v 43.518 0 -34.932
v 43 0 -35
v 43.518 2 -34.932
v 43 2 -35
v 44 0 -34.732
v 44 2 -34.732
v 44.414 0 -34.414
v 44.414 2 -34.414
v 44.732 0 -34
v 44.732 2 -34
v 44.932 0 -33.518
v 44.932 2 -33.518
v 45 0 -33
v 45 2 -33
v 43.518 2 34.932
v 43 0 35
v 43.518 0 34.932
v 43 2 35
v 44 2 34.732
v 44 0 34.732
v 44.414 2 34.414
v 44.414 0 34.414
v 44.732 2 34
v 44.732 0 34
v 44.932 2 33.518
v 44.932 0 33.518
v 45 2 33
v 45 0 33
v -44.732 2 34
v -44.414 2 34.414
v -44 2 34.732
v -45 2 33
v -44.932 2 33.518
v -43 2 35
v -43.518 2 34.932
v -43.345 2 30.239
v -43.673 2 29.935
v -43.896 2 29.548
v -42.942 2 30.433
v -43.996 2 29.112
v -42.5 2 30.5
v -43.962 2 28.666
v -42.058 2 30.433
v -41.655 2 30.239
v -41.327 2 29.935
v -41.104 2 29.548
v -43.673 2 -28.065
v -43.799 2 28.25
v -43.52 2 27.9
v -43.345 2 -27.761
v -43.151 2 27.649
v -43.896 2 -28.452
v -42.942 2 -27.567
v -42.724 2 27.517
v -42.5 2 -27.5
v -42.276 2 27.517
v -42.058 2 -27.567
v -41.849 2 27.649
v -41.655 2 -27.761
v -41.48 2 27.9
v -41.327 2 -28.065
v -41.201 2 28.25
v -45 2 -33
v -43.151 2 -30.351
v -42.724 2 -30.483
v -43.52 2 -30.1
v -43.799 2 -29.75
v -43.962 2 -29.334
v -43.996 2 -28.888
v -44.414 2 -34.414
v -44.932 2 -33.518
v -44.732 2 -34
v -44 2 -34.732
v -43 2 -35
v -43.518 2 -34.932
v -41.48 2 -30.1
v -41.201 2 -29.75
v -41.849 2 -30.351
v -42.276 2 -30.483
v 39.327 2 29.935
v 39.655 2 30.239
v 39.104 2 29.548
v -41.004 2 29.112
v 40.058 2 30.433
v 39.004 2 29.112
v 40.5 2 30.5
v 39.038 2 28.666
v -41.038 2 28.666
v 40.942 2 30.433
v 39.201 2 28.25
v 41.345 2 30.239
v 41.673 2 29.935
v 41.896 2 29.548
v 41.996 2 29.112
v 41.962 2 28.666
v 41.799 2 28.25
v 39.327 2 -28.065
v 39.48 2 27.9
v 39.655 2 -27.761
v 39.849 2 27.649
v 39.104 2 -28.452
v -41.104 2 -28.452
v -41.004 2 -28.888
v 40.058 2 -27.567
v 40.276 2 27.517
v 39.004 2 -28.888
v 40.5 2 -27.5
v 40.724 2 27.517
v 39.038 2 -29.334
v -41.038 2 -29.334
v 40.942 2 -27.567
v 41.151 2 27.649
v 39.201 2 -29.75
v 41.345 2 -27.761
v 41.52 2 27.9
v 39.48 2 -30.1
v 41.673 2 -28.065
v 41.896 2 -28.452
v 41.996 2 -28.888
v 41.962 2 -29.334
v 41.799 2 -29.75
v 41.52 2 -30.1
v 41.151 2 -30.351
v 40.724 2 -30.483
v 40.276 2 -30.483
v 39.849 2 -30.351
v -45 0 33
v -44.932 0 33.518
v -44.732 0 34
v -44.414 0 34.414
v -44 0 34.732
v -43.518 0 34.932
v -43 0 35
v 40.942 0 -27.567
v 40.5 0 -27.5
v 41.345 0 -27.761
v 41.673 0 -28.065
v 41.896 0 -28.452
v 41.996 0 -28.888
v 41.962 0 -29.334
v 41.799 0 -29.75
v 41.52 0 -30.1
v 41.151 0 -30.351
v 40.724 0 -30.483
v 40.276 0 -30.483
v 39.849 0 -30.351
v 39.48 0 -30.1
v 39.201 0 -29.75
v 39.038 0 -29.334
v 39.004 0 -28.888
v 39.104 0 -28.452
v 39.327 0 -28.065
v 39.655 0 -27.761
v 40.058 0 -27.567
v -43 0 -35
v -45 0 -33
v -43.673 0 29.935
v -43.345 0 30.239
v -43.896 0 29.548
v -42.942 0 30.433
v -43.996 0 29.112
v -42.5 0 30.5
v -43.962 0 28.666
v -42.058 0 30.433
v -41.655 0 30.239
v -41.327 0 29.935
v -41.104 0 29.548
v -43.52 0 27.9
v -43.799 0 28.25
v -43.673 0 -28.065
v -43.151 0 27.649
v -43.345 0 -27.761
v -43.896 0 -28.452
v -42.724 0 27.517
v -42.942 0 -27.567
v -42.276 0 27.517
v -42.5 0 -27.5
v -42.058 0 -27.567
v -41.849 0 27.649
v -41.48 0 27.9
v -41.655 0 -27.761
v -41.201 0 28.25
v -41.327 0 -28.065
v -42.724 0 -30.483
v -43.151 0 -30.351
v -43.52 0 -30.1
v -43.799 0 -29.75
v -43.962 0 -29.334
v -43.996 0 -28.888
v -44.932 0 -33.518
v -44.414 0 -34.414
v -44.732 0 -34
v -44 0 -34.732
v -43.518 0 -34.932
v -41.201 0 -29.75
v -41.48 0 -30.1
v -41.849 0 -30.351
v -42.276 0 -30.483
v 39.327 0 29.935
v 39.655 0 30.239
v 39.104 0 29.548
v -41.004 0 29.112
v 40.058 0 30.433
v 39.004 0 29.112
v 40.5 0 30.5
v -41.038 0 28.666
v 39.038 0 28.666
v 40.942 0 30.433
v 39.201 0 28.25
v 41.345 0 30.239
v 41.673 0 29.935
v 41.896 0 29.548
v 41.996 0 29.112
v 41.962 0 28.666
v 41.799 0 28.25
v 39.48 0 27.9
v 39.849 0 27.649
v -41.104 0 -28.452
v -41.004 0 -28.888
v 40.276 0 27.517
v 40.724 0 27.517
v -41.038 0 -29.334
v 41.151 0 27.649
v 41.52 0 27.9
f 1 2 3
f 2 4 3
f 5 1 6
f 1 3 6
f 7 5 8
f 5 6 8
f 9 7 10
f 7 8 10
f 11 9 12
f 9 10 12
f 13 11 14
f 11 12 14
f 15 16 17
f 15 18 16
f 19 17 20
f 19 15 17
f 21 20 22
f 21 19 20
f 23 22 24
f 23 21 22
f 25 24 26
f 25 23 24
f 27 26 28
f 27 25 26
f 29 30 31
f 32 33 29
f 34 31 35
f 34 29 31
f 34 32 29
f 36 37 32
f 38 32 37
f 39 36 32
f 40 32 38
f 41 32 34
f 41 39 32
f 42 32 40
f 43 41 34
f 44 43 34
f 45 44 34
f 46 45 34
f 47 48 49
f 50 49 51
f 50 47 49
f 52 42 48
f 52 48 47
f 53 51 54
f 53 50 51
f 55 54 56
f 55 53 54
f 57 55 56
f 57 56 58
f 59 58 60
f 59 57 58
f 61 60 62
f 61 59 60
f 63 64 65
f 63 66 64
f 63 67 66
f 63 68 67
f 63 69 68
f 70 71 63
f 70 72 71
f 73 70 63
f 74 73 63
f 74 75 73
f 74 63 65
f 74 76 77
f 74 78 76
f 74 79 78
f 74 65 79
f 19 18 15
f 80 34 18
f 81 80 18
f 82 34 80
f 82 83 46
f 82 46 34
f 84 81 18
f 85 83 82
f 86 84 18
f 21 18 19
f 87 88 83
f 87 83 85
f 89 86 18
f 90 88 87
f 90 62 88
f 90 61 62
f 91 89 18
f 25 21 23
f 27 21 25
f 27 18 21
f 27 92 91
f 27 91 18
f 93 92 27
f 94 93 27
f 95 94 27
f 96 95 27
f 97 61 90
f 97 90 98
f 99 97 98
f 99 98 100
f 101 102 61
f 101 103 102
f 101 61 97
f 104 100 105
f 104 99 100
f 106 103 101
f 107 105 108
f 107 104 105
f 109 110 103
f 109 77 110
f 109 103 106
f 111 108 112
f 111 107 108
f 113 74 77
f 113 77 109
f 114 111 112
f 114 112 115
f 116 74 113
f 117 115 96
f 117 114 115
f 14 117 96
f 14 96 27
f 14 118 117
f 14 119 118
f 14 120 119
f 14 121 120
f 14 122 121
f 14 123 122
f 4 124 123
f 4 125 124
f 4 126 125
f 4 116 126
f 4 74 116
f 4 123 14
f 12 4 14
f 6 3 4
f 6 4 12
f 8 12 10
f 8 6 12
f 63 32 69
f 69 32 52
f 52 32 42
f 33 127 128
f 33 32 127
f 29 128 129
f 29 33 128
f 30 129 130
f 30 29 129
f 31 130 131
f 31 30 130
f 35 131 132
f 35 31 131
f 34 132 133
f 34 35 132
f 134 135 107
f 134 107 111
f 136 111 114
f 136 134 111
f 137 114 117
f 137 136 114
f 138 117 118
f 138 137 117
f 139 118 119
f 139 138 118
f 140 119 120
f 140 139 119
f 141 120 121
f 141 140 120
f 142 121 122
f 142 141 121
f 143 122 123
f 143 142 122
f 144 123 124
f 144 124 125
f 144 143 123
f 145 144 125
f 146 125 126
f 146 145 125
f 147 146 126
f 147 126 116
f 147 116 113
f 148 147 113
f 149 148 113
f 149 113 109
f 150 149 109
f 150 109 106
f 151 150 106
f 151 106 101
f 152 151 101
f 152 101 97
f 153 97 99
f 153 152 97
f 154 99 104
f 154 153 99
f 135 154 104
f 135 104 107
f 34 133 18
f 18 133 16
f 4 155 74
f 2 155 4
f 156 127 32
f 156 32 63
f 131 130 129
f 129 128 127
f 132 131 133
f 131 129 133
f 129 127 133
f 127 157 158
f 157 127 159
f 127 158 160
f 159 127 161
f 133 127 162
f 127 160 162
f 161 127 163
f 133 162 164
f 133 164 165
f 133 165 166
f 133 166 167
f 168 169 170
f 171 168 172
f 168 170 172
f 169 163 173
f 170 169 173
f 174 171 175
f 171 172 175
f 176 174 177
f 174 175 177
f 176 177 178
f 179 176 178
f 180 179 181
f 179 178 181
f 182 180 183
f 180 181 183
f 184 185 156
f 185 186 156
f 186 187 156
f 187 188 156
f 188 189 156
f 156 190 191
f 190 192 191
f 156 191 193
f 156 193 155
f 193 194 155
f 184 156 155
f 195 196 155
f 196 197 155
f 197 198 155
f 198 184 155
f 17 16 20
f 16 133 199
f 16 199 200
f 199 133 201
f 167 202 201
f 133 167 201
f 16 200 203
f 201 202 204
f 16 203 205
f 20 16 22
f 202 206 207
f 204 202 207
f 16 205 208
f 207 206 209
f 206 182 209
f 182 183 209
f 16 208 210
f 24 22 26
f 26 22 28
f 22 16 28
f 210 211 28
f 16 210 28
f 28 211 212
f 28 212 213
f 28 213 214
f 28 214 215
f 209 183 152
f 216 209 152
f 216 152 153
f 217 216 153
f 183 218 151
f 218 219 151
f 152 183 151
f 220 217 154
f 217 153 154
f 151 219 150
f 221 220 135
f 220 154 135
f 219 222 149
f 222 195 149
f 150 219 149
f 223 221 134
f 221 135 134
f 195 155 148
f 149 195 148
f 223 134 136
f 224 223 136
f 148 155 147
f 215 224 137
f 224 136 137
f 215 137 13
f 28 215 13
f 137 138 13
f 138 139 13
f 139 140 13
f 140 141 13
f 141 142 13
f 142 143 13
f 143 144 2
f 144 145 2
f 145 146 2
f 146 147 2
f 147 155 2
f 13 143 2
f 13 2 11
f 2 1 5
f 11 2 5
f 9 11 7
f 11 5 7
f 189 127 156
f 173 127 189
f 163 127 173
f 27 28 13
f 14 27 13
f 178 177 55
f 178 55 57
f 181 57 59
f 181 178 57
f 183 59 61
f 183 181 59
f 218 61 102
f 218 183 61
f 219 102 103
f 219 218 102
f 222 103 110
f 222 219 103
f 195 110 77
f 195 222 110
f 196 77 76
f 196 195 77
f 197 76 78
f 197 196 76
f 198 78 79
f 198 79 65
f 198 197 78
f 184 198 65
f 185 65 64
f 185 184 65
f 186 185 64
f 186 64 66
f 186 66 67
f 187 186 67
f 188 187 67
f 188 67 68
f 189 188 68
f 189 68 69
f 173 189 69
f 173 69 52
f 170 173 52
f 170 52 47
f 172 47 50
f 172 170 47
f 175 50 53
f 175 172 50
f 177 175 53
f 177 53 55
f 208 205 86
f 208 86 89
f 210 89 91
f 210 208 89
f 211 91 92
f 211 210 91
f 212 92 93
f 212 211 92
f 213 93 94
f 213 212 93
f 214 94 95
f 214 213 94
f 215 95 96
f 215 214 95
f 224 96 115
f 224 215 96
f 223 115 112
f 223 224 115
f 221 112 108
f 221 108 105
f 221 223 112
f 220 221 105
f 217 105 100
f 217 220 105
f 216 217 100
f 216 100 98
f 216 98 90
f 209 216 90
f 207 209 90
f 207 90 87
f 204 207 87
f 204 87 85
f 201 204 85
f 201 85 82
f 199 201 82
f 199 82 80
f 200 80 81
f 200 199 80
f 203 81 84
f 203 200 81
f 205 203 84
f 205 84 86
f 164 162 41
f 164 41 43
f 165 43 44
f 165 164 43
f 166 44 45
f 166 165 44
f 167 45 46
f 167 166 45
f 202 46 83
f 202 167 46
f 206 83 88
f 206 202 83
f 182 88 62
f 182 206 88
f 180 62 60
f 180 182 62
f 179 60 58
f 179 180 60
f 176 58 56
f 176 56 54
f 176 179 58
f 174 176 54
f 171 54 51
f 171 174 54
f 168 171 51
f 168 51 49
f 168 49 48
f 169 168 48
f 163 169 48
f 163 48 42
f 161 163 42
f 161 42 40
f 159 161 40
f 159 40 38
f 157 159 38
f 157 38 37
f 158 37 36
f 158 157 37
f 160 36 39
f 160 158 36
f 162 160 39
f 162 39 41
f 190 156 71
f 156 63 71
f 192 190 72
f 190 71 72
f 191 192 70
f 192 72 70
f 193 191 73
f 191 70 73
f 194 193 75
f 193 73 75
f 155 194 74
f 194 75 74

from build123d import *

# Parameters (mm, degrees)
CROQUIS1_W              = 90
CROQUIS1_H              = 70
CROQUIS1_R              = 1.5
SALIENTE_EXTRUIR1_DEPTH = 2
REDONDEO1_R             = 2


with BuildPart() as part:
    # Croquis1 → Saliente-Extruir1 (new body)
    with BuildSketch(Plane(origin=(0, 0, 0), x_dir=(1, 0, 0), z_dir=(0, 1, 0))):
        Rectangle(CROQUIS1_W, CROQUIS1_H)
        with Locations(Location((-42.5, -29, 0), (0, 0, 270))):
            Circle(CROQUIS1_R, mode=Mode.SUBTRACT)
        with Locations(Location((-42.5, 29, 0), (0, 0, 270))):
            Circle(CROQUIS1_R, mode=Mode.SUBTRACT)
        with Locations(Location((40.5, -29, 0), (0, 0, 270))):
            Circle(CROQUIS1_R, mode=Mode.SUBTRACT)
        with Locations(Location((40.5, 29, 0), (0, 0, 270))):
            Circle(CROQUIS1_R, mode=Mode.SUBTRACT)
    extrude(amount=SALIENTE_EXTRUIR1_DEPTH)

    # Redondeo1
    redondeo1_edges = [part.edges().sort_by_distance(p)[0] for p in [
        (-45, 1, -35),
        (45, 1, -35),
        (45, 1, 35),
        (-45, 1, 35),
    ]]
    fillet(redondeo1_edges, radius=REDONDEO1_R)


solid = part.part
